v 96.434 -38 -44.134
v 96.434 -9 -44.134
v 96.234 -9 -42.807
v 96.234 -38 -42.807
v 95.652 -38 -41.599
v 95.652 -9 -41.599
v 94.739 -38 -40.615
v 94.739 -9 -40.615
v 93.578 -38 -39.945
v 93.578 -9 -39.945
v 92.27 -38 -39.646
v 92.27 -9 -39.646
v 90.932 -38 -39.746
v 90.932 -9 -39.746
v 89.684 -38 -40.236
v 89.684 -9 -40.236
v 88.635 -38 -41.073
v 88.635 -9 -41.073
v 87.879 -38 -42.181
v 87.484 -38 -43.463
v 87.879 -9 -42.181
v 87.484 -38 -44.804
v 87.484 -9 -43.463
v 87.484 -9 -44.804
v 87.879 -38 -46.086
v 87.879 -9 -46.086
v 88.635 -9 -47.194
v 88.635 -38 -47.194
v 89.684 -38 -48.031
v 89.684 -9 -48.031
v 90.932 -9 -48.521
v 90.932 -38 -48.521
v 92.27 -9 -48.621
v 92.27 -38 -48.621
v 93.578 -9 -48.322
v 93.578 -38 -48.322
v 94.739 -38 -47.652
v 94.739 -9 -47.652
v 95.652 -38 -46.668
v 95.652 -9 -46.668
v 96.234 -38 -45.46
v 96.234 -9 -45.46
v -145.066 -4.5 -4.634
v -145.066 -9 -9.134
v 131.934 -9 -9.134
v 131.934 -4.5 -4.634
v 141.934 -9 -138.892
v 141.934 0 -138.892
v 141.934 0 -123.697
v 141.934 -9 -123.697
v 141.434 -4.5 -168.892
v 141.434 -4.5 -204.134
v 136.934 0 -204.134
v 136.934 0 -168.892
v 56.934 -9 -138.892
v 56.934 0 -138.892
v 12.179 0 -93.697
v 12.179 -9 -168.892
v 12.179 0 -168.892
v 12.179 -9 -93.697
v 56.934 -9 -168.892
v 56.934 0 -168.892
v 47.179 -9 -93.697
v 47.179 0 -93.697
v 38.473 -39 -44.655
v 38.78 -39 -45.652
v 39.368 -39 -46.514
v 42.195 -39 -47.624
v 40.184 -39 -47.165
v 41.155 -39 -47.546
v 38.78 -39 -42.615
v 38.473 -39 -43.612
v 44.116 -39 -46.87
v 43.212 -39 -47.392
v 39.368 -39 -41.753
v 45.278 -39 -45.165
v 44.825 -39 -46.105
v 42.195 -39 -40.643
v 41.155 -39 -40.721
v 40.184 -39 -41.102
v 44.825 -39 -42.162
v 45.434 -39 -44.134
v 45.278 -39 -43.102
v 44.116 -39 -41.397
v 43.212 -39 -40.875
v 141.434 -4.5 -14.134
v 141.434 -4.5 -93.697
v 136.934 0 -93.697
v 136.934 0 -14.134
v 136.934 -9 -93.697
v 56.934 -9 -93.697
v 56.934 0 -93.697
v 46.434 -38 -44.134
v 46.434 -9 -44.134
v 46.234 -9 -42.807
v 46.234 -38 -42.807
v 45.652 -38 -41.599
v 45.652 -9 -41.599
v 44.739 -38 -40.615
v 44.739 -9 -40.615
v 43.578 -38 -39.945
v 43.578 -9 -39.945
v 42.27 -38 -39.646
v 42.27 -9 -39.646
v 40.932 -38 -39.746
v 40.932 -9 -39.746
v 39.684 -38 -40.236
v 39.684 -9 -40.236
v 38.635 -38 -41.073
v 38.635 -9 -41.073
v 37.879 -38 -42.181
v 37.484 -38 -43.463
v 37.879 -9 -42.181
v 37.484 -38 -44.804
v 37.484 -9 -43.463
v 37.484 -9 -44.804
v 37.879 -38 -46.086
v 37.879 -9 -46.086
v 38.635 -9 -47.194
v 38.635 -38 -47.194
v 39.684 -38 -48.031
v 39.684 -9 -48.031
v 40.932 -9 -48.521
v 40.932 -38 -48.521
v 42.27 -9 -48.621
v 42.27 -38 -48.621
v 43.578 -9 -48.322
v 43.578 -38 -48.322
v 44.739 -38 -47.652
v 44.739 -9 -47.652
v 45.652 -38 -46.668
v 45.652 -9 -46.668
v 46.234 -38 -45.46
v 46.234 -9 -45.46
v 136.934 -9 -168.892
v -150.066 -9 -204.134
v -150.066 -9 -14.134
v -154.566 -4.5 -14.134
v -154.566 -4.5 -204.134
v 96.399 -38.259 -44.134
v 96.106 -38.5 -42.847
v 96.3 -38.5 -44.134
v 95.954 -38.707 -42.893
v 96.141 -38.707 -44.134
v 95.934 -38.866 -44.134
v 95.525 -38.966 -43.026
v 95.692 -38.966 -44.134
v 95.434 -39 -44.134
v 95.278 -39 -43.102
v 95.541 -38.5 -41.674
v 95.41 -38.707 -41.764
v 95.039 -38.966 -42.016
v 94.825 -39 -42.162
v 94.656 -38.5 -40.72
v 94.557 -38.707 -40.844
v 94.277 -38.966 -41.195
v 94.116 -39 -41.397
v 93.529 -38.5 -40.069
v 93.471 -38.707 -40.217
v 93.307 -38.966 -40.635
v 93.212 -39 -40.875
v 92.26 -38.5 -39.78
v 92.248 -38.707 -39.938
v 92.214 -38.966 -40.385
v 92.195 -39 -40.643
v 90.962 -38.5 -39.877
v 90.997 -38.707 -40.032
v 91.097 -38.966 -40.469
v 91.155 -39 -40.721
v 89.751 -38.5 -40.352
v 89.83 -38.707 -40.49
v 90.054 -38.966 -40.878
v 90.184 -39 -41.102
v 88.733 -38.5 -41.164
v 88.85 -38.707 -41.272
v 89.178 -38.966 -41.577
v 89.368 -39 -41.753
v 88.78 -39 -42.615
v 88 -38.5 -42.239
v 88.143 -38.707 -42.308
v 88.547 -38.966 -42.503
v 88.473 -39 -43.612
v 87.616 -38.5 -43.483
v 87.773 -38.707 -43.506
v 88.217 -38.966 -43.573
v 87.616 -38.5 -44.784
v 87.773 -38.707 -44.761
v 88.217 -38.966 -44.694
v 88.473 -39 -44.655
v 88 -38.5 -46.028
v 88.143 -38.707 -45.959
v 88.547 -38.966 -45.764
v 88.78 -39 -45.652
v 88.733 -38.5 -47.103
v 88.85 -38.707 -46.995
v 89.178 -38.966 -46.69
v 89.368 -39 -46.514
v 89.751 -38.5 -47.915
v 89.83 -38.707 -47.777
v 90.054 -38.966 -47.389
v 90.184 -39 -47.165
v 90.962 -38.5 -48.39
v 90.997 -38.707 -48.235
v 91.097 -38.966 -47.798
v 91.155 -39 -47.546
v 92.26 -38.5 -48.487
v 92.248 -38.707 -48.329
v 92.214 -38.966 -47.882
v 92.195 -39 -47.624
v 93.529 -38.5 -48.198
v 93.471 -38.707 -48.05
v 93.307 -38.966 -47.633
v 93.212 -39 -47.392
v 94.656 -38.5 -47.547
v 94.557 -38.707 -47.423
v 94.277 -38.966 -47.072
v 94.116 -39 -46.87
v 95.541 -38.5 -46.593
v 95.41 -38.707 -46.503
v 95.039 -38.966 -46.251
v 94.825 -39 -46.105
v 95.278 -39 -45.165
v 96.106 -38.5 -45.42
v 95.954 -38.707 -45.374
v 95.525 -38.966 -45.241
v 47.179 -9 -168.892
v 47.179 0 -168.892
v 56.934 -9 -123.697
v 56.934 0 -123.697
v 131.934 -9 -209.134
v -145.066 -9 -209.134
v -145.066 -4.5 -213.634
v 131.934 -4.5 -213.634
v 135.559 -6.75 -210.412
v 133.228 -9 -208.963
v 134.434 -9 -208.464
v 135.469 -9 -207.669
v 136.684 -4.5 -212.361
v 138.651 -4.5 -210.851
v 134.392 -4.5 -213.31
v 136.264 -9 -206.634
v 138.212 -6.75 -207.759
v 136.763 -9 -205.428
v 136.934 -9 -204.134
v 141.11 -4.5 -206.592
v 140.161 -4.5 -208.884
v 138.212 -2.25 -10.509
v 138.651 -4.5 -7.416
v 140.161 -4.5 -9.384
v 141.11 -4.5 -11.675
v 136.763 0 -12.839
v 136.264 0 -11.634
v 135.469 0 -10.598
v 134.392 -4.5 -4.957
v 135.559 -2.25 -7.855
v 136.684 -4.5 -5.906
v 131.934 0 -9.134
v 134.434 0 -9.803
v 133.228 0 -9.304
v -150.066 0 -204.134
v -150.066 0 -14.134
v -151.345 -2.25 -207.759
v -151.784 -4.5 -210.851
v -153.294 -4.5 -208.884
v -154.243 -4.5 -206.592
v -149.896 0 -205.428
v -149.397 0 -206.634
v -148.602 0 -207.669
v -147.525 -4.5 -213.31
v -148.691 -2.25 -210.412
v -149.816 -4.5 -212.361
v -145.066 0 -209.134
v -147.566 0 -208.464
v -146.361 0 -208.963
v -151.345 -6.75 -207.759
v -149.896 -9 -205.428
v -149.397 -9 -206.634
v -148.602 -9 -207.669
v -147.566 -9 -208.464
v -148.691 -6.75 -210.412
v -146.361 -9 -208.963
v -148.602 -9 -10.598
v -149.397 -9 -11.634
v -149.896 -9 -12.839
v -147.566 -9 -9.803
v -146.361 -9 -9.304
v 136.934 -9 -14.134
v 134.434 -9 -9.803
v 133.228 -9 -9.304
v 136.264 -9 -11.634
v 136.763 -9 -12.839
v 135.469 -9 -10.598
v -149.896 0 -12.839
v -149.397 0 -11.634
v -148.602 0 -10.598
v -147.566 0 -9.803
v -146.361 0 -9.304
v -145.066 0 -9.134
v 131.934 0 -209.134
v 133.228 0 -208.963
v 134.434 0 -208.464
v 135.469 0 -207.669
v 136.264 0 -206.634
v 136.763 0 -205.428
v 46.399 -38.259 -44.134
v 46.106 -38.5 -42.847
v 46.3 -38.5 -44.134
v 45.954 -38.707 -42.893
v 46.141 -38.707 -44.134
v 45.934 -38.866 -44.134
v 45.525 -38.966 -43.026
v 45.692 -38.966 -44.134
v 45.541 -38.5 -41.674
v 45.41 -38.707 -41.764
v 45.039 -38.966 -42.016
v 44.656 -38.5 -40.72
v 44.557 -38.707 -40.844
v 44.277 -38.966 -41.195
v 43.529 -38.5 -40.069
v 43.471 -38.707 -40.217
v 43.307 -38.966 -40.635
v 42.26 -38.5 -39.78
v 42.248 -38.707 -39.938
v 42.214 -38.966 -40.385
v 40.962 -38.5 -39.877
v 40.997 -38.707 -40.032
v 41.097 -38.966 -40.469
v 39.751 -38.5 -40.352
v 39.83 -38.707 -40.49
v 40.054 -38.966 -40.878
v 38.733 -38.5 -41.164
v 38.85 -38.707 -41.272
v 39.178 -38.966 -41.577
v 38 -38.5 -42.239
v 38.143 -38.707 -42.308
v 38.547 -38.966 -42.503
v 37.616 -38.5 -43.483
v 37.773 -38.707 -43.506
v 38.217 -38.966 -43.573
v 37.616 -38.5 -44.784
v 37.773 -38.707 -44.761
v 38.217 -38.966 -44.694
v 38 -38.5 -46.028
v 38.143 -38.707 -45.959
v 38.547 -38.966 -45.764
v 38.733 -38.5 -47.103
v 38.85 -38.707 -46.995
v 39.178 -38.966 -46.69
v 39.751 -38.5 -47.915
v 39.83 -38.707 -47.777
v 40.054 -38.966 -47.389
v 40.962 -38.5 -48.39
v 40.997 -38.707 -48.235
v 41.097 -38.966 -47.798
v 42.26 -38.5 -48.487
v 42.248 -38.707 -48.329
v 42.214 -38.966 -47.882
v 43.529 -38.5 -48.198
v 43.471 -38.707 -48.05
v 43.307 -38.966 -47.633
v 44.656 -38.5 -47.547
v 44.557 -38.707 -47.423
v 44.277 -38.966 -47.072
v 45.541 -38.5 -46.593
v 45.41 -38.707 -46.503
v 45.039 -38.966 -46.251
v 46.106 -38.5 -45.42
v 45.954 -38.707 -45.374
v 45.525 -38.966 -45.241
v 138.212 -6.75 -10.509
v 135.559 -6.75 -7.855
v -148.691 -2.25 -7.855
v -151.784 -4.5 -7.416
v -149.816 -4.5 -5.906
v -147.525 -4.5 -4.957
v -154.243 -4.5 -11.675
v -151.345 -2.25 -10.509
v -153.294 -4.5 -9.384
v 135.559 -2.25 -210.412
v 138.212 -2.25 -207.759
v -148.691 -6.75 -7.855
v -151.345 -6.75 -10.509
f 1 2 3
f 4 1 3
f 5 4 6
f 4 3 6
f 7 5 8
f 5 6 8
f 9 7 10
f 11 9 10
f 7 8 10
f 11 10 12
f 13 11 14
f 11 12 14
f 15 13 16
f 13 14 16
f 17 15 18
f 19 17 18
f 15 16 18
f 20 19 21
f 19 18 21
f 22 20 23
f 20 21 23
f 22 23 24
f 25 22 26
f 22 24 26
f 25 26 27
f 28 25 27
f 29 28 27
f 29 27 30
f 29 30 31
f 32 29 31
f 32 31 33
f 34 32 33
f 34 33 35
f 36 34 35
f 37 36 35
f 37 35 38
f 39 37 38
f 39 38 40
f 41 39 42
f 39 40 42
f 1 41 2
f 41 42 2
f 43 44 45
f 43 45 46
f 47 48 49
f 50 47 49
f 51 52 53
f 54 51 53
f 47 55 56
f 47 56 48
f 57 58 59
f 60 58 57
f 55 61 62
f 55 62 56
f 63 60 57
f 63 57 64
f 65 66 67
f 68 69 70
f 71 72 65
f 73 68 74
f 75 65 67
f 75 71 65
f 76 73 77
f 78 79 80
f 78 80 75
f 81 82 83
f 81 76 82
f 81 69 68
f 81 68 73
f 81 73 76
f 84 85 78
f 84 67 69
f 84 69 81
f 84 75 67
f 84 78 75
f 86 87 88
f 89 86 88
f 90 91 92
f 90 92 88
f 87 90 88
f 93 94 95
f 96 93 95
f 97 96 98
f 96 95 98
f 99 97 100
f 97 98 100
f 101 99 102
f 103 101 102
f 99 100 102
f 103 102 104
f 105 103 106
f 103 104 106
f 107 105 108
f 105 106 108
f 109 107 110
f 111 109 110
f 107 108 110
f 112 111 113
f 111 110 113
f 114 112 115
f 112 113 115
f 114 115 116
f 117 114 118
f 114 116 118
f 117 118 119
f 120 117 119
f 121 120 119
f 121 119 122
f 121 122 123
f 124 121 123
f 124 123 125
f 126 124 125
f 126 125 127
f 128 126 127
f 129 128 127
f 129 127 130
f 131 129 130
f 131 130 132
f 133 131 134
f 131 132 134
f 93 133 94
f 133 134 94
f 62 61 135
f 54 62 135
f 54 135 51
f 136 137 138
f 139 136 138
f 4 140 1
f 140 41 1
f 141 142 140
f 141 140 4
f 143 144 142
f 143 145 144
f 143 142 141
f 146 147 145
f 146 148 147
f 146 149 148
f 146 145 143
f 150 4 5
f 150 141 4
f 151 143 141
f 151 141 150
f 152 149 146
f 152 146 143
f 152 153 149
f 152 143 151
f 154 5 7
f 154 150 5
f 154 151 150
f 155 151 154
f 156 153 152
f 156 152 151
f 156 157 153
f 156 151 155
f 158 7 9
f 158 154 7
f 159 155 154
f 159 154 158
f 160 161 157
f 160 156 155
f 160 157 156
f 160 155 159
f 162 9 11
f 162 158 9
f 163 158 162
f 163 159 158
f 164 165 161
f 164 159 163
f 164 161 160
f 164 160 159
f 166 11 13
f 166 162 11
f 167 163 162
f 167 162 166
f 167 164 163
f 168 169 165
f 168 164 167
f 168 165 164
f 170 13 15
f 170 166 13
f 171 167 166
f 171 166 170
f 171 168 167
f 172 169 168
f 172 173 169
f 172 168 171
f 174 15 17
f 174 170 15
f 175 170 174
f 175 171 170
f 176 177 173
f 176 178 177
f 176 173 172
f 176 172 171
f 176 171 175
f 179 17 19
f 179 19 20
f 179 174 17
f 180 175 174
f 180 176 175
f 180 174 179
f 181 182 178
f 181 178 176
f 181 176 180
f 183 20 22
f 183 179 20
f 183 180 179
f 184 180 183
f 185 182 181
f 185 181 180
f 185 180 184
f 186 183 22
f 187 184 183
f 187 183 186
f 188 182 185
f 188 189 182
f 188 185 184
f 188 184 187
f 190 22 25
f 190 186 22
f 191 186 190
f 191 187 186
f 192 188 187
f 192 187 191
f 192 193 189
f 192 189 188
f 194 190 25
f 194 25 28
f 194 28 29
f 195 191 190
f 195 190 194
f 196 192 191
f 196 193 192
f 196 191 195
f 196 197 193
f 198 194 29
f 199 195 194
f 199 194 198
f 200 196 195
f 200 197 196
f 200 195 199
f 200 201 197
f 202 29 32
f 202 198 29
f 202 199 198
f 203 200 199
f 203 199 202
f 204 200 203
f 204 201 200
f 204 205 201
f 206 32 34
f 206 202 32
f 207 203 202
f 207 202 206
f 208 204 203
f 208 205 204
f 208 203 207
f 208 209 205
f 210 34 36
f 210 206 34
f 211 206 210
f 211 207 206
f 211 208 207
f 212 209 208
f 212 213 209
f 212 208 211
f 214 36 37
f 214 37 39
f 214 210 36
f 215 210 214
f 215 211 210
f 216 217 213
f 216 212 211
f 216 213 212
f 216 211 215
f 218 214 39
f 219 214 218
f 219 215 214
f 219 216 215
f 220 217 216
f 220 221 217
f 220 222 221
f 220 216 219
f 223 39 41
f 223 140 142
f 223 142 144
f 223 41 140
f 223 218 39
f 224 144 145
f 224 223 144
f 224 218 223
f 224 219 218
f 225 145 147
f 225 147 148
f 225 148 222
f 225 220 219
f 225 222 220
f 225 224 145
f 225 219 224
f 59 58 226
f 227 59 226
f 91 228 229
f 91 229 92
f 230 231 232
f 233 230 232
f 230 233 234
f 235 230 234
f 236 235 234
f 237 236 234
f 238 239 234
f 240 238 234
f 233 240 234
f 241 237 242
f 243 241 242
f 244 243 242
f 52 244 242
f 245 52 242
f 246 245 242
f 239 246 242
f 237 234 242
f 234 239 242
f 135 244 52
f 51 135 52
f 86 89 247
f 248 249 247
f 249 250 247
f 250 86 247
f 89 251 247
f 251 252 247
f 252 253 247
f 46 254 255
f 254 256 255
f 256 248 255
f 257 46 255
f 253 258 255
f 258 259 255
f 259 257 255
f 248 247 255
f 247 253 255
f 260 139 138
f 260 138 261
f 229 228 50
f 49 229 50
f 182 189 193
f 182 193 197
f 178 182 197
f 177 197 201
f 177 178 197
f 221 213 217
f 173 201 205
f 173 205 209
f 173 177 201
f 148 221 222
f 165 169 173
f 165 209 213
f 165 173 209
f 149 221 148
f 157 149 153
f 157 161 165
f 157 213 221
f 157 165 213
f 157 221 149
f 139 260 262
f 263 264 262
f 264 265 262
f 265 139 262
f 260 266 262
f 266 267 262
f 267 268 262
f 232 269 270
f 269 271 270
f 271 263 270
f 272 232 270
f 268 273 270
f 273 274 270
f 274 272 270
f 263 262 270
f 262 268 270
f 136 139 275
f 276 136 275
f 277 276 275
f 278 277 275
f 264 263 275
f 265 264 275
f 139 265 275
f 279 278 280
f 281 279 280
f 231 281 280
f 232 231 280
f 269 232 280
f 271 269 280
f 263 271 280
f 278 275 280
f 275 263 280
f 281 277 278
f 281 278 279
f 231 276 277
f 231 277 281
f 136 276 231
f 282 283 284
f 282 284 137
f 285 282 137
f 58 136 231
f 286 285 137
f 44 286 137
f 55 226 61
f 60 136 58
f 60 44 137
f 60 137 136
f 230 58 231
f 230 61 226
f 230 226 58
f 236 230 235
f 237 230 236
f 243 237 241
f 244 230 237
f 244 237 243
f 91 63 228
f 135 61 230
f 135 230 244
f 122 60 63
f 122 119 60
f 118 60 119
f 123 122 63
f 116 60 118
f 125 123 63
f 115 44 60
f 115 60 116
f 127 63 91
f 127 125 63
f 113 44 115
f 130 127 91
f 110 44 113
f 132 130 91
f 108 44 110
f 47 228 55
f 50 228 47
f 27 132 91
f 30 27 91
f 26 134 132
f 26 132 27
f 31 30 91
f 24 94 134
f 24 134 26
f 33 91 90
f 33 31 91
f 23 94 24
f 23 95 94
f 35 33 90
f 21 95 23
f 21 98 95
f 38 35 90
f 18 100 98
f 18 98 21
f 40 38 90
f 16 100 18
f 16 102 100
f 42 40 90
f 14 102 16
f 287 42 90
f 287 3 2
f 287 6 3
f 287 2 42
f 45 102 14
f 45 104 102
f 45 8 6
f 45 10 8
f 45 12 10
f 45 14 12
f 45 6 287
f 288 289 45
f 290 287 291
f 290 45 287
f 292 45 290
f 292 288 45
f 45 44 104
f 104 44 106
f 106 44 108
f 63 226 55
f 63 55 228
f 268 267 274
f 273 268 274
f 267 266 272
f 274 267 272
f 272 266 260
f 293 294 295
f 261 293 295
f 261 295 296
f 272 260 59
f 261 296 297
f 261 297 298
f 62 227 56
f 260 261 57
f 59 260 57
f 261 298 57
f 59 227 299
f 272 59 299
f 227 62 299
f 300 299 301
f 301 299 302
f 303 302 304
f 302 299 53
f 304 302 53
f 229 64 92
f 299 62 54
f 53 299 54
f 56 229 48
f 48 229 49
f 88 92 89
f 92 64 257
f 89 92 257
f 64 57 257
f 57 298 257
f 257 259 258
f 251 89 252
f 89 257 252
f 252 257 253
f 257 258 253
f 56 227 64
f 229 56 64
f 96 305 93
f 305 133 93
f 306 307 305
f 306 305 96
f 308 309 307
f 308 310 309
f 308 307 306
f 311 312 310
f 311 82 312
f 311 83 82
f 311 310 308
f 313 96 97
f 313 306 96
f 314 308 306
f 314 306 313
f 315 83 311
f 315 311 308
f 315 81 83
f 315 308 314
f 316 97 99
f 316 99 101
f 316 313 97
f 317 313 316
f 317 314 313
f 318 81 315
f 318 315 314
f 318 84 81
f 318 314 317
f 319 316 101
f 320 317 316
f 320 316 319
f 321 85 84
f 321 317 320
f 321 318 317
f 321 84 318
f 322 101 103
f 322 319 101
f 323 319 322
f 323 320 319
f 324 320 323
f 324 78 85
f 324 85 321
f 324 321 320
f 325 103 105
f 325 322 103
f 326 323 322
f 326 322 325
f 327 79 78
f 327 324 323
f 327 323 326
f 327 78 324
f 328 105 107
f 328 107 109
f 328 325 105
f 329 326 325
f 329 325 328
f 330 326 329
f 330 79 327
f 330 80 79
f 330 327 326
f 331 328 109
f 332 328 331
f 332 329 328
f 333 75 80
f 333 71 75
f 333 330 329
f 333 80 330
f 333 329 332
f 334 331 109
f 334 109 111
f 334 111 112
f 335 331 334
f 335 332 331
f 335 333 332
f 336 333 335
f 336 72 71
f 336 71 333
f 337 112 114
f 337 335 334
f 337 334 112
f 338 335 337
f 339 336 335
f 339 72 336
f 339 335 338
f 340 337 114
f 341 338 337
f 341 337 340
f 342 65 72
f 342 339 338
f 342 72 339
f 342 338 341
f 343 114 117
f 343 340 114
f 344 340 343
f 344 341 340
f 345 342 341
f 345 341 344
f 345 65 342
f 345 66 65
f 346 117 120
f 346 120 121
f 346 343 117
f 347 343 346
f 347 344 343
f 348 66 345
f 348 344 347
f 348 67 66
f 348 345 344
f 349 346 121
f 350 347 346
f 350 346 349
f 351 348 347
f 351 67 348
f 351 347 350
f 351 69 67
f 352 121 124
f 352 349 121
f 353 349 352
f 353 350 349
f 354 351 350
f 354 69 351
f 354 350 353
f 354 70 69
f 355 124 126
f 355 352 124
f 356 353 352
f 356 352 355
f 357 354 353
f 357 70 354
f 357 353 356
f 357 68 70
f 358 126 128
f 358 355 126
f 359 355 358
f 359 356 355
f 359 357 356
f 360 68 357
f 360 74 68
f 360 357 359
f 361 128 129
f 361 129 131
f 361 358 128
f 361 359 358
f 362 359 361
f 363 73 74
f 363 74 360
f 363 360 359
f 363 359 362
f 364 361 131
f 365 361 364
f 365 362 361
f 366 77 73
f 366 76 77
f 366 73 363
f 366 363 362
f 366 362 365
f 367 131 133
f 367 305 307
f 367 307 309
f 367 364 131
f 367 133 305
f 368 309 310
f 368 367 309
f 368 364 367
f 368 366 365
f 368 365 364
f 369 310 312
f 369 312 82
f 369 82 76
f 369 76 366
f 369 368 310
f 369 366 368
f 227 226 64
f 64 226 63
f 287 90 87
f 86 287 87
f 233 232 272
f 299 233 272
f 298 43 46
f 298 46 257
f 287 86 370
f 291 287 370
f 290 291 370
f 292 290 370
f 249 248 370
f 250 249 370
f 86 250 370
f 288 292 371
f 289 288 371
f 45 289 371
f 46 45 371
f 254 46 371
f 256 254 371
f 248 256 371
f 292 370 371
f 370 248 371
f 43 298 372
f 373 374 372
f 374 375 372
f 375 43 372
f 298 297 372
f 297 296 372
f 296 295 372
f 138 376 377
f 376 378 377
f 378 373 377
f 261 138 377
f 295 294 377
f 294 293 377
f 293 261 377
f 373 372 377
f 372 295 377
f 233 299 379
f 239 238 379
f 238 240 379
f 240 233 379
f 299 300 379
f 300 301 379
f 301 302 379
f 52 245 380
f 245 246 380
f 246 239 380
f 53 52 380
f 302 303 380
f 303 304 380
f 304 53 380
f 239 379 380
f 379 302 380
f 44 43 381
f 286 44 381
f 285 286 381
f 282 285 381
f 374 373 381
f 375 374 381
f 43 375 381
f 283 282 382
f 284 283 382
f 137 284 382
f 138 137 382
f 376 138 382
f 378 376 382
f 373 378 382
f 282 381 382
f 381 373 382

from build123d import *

# Parameters (mm, degrees)
F1_DEPTH      = 9
F2_R          = 4.5
F3_DEPTH      = 30
F4_W          = 85
F4_H          = 30
F5_DEPTH      = 25
F6_W          = 85
F6_H          = 30
F7_DEPTH      = 25
F9_R          = 1
F10_T1_DEPTH  = 277
F10_T3_DEPTH  = 190
F10_T5_DEPTH  = 48.1001500805
F10_T7_DEPTH  = 92.4223044172
F10_T10_ANGLE = 90
F10_T12_ANGLE = 90
F10_T14_ANGLE = 90
F10_T16_ANGLE = 90
F10_T18_ANGLE = 90
F10_T20_ANGLE = 90
F10_T22_ANGLE = 90
F10_T24_ANGLE = 90
F8_W          = 35
F8_H          = 75.194375382
F11_DEPTH     = 25


# Not quite as in the source:
# - a fillet or chamfer that OpenCascade refuses, or shapes differently, is made with other operations: its cross-section is extruded or revolved along the edge and cut away or added


with BuildPart() as f1:
    # F0 (on Front) → F1 (new body)
    with BuildSketch(Plane.XZ):
        with BuildLine():
            Line((131.9335396439, -4.1335214776), (-145.0664603561, -4.1335214776))
            ThreePointArc((-145.0664603561, -4.1335214776), (-152.137528168, -7.0624536657), (-155.0664603561, -14.1335214776))
            Line((-155.0664603561, -14.1335214776), (-155.0664603561, -204.1335214776))
            ThreePointArc((-155.0664603561, -204.1335214776), (-152.137528168, -211.2045892894), (-145.0664603561, -214.1335214776))
            Line((-145.0664603561, -214.1335214776), (131.9335396439, -214.1335214776))
            ThreePointArc((131.9335396439, -214.1335214776), (139.0046074557, -211.2045892894), (141.9335396439, -204.1335214776))
            Line((141.9335396439, -204.1335214776), (141.9335396439, -14.1335214776))
            ThreePointArc((141.9335396439, -14.1335214776), (139.0046074557, -7.0624536657), (131.9335396439, -4.1335214776))
        make_face()
    extrude(amount=F1_DEPTH)

    # F2 (on face) → F3 (join)
    with BuildSketch(Plane.XZ.offset(9)):
        with Locations((41.9335396439, -44.1335214776)):
            Circle(F2_R)
        with Locations((91.9335396439, -44.1335214776)):
            Circle(F2_R)
    extrude(amount=F3_DEPTH)

    # F4 (on face) → F5 (cut)
    with BuildSketch(Plane.XZ.offset(9)):
        with Locations((99.4335396439, -108.6974109549)):
            Rectangle(F4_W, F4_H)
    extrude(amount=-F5_DEPTH, mode=Mode.SUBTRACT)

    # F6 (on face) → F7 (cut)
    with BuildSketch(Plane.XZ.offset(9)):
        with Locations((99.4335396439, -153.8917863369)):
            Rectangle(F6_W, F6_H)
    extrude(amount=-F7_DEPTH, mode=Mode.SUBTRACT)

    # F9
    f9_edges = [f1.edges().sort_by_distance(p)[0] for p in [
        (37.43354, -39, -44.133521),
        (87.43354, -39, -44.133521),
    ]]
    fillet(f9_edges, radius=F9_R)

    # F10: chamfer of 5 on 2 edges, made by hand

    # F10_s2 → F10_t1 (cut)
    with BuildSketch(Plane.YZ.offset(-145.0664603561)):
        Polygon((-9, -9.1335214776), (-4, -4.1335214776), (-9, -4.1335214776), align=None)
        Polygon((-5, -4.1335214776), (0, -9.1335214776), (0, -4.1335214776), align=None)
        Polygon((-5, -214.1335214776), (0, -209.1335214776), (0, -214.1335214776), align=None)
        Polygon((-9, -209.1335214776), (-4, -214.1335214776), (-9, -214.1335214776), align=None)
    extrude(amount=F10_T1_DEPTH, mode=Mode.SUBTRACT)

    # F10_s4 → F10_t3 (cut)
    with BuildSketch(Plane.XY.offset(-204.1335214776)):
        Polygon((-155.0664603561, -5), (-150.0664603561, 0), (-155.0664603561, 0), align=None)
        Polygon((-150.0664603561, -9), (-155.0664603561, -4), (-155.0664603561, -9), align=None)
    extrude(amount=F10_T3_DEPTH, mode=Mode.SUBTRACT)

    # F10_s6 → F10_t5 (cut)
    with BuildSketch(Plane.XY.offset(-204.1335214776)):
        Polygon((141.9335396439, -5), (136.9335396439, 0), (141.9335396439, 0), align=None)
        Polygon((136.9335396439, -9), (141.9335396439, -4), (141.9335396439, -9), align=None)
    extrude(amount=F10_T5_DEPTH, mode=Mode.SUBTRACT)

    # F10_s8 → F10_t7 (cut)
    with BuildSketch(Plane.XY.offset(-106.5558258947)):
        Polygon((141.9335396439, -5), (136.9335396439, 0), (141.9335396439, 0), align=None)
        Polygon((136.9335396439, -9), (141.9335396439, -4), (141.9335396439, -9), align=None)
    extrude(amount=F10_T7_DEPTH, mode=Mode.SUBTRACT)

    # F10_s9 → F10_t10 (revolve, cut)
    with BuildSketch(Plane.XY.offset(-14.1335214776)):
        Polygon((141.9335396439, -5), (136.9335396439, 0), (141.9335396439, 0), align=None)
    revolve(axis=Axis((131.9335396439, 0, -14.1335214776), (0, -1, 0)), revolution_arc=F10_T10_ANGLE, mode=Mode.SUBTRACT)

    # F10_s11 → F10_t12 (revolve, cut)
    with BuildSketch(Plane.YZ.offset(-145.0664603561)):
        Polygon((-5, -4.1335214776), (0, -9.1335214776), (0, -4.1335214776), align=None)
    revolve(axis=Axis((-145.0664603561, 0, -14.1335214776), (0, -1, 0)), revolution_arc=F10_T12_ANGLE, mode=Mode.SUBTRACT)

    # F10_s13 → F10_t14 (revolve, cut)
    with BuildSketch(Plane.XY.offset(-204.1335214776)):
        Polygon((-155.0664603561, -5), (-150.0664603561, 0), (-155.0664603561, 0), align=None)
    revolve(axis=Axis((-145.0664603561, 0, -204.1335214776), (0, -1, 0)), revolution_arc=F10_T14_ANGLE, mode=Mode.SUBTRACT)

    # F10_s15 → F10_t16 (revolve, cut)
    with BuildSketch(Plane.YZ.offset(131.9335396439)):
        Polygon((-5, -214.1335214776), (0, -209.1335214776), (0, -214.1335214776), align=None)
    revolve(axis=Axis((131.9335396439, 0, -204.1335214776), (0, -1, 0)), revolution_arc=F10_T16_ANGLE, mode=Mode.SUBTRACT)

    # F10_s17 → F10_t18 (revolve, cut)
    with BuildSketch(Plane.XY.offset(-14.1335214776)):
        Polygon((136.9335396439, -9), (141.9335396439, -4), (141.9335396439, -9), align=None)
    revolve(axis=Axis((131.9335396439, -9, -14.1335214776), (0, -1, 0)), revolution_arc=F10_T18_ANGLE, mode=Mode.SUBTRACT)

    # F10_s19 → F10_t20 (revolve, cut)
    with BuildSketch(Plane.YZ.offset(-145.0664603561)):
        Polygon((-9, -9.1335214776), (-4, -4.1335214776), (-9, -4.1335214776), align=None)
    revolve(axis=Axis((-145.0664603561, -9, -14.1335214776), (0, -1, 0)), revolution_arc=F10_T20_ANGLE, mode=Mode.SUBTRACT)

    # F10_s21 → F10_t22 (revolve, cut)
    with BuildSketch(Plane.XY.offset(-204.1335214776)):
        Polygon((-150.0664603561, -9), (-155.0664603561, -4), (-155.0664603561, -9), align=None)
    revolve(axis=Axis((-145.0664603561, -9, -204.1335214776), (0, -1, 0)), revolution_arc=F10_T22_ANGLE, mode=Mode.SUBTRACT)

    # F10_s23 → F10_t24 (revolve, cut)
    with BuildSketch(Plane.YZ.offset(131.9335396439)):
        Polygon((-9, -209.1335214776), (-4, -214.1335214776), (-9, -214.1335214776), align=None)
    revolve(axis=Axis((131.9335396439, -9, -204.1335214776), (0, -1, 0)), revolution_arc=F10_T24_ANGLE, mode=Mode.SUBTRACT)

    # F8 (on face) → F11 (cut)
    with BuildSketch(Plane.XZ.offset(9)):
        with Locations((29.6793225408, -131.2945986459)):
            Rectangle(F8_W, F8_H)
    extrude(amount=-F11_DEPTH, mode=Mode.SUBTRACT)


solid = f1.part
